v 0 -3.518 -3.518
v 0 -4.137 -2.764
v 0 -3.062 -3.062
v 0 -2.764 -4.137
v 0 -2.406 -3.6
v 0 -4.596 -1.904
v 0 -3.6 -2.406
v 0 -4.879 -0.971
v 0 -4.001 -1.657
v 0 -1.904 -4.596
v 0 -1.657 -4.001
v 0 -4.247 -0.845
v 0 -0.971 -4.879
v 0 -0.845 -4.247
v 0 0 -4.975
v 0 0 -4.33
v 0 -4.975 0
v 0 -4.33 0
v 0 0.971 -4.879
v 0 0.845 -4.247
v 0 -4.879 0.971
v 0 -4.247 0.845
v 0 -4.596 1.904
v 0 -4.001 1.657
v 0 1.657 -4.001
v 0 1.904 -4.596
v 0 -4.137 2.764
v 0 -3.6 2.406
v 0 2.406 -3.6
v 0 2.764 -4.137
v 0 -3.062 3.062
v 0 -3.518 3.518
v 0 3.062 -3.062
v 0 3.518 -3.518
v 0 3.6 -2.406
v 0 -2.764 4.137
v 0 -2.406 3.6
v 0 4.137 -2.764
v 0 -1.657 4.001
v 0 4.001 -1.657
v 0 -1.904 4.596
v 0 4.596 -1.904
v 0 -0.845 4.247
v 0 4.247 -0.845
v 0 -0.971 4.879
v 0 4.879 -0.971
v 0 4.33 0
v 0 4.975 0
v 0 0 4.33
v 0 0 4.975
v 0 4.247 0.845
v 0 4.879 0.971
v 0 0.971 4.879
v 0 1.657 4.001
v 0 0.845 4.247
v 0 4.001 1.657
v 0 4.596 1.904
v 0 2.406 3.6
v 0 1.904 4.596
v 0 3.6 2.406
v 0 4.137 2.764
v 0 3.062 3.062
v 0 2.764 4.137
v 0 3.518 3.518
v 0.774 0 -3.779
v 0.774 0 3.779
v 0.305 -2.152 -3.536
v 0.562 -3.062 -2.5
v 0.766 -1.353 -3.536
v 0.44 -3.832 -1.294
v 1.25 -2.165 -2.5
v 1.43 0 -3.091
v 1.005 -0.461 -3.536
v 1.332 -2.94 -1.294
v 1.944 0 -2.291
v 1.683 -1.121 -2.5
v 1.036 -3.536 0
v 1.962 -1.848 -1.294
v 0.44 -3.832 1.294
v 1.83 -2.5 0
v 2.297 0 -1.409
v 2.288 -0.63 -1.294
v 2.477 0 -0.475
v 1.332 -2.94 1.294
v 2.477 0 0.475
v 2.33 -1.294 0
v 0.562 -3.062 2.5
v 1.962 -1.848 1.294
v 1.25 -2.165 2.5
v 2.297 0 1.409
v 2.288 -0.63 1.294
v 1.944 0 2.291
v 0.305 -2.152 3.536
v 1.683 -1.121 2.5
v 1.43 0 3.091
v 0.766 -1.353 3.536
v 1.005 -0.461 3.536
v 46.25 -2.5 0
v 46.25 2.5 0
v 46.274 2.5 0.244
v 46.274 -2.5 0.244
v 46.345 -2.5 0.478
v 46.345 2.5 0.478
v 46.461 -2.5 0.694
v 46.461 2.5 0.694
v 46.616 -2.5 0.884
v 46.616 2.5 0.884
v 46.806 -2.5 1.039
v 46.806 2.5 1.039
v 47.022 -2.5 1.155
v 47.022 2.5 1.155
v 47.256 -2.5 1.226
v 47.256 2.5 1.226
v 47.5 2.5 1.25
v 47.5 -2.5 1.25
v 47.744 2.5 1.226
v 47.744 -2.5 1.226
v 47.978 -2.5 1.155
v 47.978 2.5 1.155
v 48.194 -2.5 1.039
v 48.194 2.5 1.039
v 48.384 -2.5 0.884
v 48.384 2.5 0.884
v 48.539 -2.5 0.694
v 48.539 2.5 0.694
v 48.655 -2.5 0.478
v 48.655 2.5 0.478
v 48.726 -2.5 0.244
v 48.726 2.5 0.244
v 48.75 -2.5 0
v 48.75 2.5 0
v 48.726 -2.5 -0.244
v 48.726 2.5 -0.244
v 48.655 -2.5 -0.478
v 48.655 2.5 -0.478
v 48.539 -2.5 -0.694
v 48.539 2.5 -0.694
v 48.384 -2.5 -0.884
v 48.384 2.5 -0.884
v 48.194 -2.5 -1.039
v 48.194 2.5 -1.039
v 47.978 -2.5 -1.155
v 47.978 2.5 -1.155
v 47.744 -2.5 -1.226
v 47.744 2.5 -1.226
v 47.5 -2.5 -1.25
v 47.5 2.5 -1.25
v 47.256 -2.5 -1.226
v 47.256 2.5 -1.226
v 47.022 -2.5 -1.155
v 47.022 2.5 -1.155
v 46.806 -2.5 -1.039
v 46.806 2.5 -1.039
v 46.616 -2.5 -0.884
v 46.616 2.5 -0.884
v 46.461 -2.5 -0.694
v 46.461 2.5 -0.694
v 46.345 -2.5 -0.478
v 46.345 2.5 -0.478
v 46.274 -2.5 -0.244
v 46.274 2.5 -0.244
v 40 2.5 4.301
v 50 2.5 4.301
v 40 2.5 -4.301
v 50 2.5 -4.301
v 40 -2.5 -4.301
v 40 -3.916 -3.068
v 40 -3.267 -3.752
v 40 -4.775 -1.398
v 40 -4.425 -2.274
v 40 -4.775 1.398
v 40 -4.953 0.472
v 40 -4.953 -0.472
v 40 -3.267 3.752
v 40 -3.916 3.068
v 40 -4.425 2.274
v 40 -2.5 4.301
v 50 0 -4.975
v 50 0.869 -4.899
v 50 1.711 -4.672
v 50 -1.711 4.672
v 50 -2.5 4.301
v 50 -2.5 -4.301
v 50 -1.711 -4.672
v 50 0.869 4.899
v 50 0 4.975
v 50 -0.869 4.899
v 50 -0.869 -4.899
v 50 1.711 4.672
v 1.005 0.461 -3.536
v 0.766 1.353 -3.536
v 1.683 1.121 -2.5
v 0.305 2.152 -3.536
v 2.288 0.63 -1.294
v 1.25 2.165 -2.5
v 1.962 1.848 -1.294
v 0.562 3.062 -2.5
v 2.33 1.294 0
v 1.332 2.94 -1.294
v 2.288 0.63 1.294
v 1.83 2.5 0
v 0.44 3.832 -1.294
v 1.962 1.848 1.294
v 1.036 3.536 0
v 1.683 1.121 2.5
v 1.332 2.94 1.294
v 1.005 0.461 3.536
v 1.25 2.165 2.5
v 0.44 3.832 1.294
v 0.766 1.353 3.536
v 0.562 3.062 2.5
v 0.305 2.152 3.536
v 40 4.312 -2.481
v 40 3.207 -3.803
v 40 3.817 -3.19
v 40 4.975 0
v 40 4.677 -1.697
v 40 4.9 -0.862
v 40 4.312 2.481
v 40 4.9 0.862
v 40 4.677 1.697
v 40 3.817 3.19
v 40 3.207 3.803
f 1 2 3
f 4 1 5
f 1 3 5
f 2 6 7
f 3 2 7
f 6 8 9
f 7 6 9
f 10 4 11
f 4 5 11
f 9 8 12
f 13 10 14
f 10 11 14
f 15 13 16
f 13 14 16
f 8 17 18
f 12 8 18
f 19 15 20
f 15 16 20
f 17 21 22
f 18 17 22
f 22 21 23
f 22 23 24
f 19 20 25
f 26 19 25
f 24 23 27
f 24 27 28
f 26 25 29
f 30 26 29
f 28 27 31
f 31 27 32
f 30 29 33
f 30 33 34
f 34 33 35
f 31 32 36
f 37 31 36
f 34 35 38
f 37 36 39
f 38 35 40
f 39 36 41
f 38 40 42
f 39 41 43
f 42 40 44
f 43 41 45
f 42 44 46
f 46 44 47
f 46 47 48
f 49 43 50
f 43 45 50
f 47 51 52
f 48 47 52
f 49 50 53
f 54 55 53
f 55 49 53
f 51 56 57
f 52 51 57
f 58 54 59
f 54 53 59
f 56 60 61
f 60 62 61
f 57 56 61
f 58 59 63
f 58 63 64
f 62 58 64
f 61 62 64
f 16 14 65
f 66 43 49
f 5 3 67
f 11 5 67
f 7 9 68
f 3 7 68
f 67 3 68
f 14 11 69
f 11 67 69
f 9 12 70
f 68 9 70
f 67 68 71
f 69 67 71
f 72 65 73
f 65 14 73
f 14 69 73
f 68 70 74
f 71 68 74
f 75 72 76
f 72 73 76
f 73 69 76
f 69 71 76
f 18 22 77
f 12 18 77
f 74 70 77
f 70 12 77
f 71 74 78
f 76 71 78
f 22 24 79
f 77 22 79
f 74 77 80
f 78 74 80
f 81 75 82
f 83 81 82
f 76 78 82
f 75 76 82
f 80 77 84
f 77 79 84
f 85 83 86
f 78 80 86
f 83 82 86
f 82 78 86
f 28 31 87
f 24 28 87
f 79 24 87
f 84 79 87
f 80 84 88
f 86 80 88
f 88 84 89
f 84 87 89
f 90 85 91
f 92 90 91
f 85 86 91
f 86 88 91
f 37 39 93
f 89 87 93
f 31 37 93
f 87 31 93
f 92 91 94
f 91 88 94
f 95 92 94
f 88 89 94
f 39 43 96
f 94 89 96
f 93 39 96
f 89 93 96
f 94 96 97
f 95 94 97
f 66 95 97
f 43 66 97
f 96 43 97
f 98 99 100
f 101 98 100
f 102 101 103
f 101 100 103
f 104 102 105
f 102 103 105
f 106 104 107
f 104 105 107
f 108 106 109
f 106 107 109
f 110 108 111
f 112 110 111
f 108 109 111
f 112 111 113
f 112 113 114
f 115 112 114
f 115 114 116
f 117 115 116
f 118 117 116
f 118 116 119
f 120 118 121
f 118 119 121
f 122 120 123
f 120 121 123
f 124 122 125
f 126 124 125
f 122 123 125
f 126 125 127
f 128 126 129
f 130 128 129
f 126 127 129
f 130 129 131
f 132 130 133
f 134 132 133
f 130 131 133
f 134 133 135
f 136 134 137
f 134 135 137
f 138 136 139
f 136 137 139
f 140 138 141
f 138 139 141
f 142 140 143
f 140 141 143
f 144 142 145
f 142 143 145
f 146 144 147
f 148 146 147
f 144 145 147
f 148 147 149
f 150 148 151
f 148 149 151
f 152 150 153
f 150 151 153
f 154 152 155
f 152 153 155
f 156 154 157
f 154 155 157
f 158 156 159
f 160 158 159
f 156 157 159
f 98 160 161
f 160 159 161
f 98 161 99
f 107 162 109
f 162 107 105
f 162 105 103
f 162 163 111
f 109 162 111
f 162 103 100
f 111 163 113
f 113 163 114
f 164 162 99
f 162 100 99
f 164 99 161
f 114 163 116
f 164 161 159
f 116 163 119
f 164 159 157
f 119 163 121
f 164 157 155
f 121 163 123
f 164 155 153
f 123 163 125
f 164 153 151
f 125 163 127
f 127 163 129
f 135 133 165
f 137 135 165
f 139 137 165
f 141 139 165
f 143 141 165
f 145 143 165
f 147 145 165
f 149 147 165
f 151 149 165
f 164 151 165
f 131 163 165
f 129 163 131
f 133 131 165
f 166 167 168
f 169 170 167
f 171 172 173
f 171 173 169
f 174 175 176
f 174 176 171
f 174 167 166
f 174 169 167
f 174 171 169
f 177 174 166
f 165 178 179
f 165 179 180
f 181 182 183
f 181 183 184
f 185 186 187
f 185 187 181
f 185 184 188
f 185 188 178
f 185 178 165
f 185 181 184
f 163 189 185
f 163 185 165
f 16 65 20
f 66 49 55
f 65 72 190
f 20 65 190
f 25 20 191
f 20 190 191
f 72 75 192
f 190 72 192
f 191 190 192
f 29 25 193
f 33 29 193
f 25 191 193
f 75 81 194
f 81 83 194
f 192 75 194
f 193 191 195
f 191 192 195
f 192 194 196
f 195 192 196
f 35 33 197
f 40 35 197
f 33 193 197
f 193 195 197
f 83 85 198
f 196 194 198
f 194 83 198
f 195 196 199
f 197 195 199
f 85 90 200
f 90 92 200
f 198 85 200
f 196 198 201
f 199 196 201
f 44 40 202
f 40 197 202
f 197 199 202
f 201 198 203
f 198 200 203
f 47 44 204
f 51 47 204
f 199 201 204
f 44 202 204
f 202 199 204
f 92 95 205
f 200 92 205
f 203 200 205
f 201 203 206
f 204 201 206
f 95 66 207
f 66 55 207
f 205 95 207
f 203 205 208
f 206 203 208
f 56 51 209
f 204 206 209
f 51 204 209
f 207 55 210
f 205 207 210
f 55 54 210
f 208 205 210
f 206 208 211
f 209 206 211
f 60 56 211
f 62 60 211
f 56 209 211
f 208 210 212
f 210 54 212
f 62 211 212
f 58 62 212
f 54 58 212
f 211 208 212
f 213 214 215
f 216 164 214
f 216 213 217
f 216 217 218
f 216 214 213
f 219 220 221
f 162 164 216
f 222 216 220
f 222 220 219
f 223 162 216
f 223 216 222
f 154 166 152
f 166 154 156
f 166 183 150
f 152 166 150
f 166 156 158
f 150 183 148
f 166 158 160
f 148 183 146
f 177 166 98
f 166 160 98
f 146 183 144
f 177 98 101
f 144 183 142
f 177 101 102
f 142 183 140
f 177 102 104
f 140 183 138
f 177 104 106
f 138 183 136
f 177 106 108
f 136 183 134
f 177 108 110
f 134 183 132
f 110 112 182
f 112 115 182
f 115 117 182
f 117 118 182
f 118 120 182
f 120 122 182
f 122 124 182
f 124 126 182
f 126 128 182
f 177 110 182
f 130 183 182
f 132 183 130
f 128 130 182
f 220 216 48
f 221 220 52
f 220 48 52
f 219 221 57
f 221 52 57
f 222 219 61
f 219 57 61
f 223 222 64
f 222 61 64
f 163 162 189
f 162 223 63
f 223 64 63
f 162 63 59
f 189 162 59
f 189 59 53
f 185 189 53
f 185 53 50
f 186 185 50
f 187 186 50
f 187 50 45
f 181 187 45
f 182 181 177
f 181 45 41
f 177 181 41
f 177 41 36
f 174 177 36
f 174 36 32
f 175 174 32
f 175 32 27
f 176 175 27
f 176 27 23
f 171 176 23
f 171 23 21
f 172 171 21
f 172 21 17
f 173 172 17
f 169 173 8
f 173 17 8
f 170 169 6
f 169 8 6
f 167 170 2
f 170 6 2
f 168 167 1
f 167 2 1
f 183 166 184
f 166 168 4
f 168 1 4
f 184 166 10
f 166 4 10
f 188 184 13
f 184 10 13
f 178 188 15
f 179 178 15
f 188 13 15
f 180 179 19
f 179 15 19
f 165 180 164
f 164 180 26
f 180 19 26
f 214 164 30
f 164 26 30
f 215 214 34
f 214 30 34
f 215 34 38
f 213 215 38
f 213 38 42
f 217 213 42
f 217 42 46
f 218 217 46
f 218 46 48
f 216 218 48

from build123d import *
from build123d import SkipClean  # not in build123d's __all__

# Parameters (mm, degrees)
F0_R     = 4.975
F1_DEPTH = 50
F3_DEPTH = 10
F4_R     = 1.25
F5_DEPTH = 5


with BuildPart() as f1:
    # F0 (on Right) → F1 (new body)
    with BuildSketch(Plane.YZ):
        Circle(F0_R)
    extrude(amount=F1_DEPTH)

    # F2 (on face) → F3 (cut)
    with BuildSketch(Plane.YZ.offset(50)):
        with BuildLine():
            Line((2.5, 4.3012352877), (2.5, -4.3012352877))
            ThreePointArc((2.5, -4.3012352877), (4.3120833132, -2.4812421285), (4.975, 0))
            ThreePointArc((4.975, 0), (4.3120833132, 2.4812421285), (2.5, 4.3012352877))
        make_face()
        with BuildLine():
            ThreePointArc((-2.5, 4.3012352877), (-4.975, 0), (-2.5, -4.3012352877))
            Line((-2.5, -4.3012352877), (-2.5, 4.3012352877))
        make_face()
    extrude(amount=-F3_DEPTH, mode=Mode.SUBTRACT)

    # F4 (on face) → F5 (cut)
    with BuildSketch(Plane(origin=(0, 2.5, 0), x_dir=(-1, 0, 0), z_dir=(0, 1, 0))):
        with Locations((-47.5, 0)):
            Circle(F4_R)
    extrude(amount=-F5_DEPTH, mode=Mode.SUBTRACT)

    # F6 (on Front) → F7 (revolve, cut)
    with BuildSketch(Plane.XZ):
        with BuildLine():
            Line((-2.5, 5), (-2.5, -5))
            ThreePointArc((-2.5, -5), (2.5, 0), (-2.5, 5))
        make_face()
    with SkipClean():  # cleaning this boolean's faces spoils the solid; the shape is the same uncleaned
        revolve(axis=Axis((-2.5, 0, 0), (0, 0, 1)), mode=Mode.SUBTRACT)


solid = f1.part
